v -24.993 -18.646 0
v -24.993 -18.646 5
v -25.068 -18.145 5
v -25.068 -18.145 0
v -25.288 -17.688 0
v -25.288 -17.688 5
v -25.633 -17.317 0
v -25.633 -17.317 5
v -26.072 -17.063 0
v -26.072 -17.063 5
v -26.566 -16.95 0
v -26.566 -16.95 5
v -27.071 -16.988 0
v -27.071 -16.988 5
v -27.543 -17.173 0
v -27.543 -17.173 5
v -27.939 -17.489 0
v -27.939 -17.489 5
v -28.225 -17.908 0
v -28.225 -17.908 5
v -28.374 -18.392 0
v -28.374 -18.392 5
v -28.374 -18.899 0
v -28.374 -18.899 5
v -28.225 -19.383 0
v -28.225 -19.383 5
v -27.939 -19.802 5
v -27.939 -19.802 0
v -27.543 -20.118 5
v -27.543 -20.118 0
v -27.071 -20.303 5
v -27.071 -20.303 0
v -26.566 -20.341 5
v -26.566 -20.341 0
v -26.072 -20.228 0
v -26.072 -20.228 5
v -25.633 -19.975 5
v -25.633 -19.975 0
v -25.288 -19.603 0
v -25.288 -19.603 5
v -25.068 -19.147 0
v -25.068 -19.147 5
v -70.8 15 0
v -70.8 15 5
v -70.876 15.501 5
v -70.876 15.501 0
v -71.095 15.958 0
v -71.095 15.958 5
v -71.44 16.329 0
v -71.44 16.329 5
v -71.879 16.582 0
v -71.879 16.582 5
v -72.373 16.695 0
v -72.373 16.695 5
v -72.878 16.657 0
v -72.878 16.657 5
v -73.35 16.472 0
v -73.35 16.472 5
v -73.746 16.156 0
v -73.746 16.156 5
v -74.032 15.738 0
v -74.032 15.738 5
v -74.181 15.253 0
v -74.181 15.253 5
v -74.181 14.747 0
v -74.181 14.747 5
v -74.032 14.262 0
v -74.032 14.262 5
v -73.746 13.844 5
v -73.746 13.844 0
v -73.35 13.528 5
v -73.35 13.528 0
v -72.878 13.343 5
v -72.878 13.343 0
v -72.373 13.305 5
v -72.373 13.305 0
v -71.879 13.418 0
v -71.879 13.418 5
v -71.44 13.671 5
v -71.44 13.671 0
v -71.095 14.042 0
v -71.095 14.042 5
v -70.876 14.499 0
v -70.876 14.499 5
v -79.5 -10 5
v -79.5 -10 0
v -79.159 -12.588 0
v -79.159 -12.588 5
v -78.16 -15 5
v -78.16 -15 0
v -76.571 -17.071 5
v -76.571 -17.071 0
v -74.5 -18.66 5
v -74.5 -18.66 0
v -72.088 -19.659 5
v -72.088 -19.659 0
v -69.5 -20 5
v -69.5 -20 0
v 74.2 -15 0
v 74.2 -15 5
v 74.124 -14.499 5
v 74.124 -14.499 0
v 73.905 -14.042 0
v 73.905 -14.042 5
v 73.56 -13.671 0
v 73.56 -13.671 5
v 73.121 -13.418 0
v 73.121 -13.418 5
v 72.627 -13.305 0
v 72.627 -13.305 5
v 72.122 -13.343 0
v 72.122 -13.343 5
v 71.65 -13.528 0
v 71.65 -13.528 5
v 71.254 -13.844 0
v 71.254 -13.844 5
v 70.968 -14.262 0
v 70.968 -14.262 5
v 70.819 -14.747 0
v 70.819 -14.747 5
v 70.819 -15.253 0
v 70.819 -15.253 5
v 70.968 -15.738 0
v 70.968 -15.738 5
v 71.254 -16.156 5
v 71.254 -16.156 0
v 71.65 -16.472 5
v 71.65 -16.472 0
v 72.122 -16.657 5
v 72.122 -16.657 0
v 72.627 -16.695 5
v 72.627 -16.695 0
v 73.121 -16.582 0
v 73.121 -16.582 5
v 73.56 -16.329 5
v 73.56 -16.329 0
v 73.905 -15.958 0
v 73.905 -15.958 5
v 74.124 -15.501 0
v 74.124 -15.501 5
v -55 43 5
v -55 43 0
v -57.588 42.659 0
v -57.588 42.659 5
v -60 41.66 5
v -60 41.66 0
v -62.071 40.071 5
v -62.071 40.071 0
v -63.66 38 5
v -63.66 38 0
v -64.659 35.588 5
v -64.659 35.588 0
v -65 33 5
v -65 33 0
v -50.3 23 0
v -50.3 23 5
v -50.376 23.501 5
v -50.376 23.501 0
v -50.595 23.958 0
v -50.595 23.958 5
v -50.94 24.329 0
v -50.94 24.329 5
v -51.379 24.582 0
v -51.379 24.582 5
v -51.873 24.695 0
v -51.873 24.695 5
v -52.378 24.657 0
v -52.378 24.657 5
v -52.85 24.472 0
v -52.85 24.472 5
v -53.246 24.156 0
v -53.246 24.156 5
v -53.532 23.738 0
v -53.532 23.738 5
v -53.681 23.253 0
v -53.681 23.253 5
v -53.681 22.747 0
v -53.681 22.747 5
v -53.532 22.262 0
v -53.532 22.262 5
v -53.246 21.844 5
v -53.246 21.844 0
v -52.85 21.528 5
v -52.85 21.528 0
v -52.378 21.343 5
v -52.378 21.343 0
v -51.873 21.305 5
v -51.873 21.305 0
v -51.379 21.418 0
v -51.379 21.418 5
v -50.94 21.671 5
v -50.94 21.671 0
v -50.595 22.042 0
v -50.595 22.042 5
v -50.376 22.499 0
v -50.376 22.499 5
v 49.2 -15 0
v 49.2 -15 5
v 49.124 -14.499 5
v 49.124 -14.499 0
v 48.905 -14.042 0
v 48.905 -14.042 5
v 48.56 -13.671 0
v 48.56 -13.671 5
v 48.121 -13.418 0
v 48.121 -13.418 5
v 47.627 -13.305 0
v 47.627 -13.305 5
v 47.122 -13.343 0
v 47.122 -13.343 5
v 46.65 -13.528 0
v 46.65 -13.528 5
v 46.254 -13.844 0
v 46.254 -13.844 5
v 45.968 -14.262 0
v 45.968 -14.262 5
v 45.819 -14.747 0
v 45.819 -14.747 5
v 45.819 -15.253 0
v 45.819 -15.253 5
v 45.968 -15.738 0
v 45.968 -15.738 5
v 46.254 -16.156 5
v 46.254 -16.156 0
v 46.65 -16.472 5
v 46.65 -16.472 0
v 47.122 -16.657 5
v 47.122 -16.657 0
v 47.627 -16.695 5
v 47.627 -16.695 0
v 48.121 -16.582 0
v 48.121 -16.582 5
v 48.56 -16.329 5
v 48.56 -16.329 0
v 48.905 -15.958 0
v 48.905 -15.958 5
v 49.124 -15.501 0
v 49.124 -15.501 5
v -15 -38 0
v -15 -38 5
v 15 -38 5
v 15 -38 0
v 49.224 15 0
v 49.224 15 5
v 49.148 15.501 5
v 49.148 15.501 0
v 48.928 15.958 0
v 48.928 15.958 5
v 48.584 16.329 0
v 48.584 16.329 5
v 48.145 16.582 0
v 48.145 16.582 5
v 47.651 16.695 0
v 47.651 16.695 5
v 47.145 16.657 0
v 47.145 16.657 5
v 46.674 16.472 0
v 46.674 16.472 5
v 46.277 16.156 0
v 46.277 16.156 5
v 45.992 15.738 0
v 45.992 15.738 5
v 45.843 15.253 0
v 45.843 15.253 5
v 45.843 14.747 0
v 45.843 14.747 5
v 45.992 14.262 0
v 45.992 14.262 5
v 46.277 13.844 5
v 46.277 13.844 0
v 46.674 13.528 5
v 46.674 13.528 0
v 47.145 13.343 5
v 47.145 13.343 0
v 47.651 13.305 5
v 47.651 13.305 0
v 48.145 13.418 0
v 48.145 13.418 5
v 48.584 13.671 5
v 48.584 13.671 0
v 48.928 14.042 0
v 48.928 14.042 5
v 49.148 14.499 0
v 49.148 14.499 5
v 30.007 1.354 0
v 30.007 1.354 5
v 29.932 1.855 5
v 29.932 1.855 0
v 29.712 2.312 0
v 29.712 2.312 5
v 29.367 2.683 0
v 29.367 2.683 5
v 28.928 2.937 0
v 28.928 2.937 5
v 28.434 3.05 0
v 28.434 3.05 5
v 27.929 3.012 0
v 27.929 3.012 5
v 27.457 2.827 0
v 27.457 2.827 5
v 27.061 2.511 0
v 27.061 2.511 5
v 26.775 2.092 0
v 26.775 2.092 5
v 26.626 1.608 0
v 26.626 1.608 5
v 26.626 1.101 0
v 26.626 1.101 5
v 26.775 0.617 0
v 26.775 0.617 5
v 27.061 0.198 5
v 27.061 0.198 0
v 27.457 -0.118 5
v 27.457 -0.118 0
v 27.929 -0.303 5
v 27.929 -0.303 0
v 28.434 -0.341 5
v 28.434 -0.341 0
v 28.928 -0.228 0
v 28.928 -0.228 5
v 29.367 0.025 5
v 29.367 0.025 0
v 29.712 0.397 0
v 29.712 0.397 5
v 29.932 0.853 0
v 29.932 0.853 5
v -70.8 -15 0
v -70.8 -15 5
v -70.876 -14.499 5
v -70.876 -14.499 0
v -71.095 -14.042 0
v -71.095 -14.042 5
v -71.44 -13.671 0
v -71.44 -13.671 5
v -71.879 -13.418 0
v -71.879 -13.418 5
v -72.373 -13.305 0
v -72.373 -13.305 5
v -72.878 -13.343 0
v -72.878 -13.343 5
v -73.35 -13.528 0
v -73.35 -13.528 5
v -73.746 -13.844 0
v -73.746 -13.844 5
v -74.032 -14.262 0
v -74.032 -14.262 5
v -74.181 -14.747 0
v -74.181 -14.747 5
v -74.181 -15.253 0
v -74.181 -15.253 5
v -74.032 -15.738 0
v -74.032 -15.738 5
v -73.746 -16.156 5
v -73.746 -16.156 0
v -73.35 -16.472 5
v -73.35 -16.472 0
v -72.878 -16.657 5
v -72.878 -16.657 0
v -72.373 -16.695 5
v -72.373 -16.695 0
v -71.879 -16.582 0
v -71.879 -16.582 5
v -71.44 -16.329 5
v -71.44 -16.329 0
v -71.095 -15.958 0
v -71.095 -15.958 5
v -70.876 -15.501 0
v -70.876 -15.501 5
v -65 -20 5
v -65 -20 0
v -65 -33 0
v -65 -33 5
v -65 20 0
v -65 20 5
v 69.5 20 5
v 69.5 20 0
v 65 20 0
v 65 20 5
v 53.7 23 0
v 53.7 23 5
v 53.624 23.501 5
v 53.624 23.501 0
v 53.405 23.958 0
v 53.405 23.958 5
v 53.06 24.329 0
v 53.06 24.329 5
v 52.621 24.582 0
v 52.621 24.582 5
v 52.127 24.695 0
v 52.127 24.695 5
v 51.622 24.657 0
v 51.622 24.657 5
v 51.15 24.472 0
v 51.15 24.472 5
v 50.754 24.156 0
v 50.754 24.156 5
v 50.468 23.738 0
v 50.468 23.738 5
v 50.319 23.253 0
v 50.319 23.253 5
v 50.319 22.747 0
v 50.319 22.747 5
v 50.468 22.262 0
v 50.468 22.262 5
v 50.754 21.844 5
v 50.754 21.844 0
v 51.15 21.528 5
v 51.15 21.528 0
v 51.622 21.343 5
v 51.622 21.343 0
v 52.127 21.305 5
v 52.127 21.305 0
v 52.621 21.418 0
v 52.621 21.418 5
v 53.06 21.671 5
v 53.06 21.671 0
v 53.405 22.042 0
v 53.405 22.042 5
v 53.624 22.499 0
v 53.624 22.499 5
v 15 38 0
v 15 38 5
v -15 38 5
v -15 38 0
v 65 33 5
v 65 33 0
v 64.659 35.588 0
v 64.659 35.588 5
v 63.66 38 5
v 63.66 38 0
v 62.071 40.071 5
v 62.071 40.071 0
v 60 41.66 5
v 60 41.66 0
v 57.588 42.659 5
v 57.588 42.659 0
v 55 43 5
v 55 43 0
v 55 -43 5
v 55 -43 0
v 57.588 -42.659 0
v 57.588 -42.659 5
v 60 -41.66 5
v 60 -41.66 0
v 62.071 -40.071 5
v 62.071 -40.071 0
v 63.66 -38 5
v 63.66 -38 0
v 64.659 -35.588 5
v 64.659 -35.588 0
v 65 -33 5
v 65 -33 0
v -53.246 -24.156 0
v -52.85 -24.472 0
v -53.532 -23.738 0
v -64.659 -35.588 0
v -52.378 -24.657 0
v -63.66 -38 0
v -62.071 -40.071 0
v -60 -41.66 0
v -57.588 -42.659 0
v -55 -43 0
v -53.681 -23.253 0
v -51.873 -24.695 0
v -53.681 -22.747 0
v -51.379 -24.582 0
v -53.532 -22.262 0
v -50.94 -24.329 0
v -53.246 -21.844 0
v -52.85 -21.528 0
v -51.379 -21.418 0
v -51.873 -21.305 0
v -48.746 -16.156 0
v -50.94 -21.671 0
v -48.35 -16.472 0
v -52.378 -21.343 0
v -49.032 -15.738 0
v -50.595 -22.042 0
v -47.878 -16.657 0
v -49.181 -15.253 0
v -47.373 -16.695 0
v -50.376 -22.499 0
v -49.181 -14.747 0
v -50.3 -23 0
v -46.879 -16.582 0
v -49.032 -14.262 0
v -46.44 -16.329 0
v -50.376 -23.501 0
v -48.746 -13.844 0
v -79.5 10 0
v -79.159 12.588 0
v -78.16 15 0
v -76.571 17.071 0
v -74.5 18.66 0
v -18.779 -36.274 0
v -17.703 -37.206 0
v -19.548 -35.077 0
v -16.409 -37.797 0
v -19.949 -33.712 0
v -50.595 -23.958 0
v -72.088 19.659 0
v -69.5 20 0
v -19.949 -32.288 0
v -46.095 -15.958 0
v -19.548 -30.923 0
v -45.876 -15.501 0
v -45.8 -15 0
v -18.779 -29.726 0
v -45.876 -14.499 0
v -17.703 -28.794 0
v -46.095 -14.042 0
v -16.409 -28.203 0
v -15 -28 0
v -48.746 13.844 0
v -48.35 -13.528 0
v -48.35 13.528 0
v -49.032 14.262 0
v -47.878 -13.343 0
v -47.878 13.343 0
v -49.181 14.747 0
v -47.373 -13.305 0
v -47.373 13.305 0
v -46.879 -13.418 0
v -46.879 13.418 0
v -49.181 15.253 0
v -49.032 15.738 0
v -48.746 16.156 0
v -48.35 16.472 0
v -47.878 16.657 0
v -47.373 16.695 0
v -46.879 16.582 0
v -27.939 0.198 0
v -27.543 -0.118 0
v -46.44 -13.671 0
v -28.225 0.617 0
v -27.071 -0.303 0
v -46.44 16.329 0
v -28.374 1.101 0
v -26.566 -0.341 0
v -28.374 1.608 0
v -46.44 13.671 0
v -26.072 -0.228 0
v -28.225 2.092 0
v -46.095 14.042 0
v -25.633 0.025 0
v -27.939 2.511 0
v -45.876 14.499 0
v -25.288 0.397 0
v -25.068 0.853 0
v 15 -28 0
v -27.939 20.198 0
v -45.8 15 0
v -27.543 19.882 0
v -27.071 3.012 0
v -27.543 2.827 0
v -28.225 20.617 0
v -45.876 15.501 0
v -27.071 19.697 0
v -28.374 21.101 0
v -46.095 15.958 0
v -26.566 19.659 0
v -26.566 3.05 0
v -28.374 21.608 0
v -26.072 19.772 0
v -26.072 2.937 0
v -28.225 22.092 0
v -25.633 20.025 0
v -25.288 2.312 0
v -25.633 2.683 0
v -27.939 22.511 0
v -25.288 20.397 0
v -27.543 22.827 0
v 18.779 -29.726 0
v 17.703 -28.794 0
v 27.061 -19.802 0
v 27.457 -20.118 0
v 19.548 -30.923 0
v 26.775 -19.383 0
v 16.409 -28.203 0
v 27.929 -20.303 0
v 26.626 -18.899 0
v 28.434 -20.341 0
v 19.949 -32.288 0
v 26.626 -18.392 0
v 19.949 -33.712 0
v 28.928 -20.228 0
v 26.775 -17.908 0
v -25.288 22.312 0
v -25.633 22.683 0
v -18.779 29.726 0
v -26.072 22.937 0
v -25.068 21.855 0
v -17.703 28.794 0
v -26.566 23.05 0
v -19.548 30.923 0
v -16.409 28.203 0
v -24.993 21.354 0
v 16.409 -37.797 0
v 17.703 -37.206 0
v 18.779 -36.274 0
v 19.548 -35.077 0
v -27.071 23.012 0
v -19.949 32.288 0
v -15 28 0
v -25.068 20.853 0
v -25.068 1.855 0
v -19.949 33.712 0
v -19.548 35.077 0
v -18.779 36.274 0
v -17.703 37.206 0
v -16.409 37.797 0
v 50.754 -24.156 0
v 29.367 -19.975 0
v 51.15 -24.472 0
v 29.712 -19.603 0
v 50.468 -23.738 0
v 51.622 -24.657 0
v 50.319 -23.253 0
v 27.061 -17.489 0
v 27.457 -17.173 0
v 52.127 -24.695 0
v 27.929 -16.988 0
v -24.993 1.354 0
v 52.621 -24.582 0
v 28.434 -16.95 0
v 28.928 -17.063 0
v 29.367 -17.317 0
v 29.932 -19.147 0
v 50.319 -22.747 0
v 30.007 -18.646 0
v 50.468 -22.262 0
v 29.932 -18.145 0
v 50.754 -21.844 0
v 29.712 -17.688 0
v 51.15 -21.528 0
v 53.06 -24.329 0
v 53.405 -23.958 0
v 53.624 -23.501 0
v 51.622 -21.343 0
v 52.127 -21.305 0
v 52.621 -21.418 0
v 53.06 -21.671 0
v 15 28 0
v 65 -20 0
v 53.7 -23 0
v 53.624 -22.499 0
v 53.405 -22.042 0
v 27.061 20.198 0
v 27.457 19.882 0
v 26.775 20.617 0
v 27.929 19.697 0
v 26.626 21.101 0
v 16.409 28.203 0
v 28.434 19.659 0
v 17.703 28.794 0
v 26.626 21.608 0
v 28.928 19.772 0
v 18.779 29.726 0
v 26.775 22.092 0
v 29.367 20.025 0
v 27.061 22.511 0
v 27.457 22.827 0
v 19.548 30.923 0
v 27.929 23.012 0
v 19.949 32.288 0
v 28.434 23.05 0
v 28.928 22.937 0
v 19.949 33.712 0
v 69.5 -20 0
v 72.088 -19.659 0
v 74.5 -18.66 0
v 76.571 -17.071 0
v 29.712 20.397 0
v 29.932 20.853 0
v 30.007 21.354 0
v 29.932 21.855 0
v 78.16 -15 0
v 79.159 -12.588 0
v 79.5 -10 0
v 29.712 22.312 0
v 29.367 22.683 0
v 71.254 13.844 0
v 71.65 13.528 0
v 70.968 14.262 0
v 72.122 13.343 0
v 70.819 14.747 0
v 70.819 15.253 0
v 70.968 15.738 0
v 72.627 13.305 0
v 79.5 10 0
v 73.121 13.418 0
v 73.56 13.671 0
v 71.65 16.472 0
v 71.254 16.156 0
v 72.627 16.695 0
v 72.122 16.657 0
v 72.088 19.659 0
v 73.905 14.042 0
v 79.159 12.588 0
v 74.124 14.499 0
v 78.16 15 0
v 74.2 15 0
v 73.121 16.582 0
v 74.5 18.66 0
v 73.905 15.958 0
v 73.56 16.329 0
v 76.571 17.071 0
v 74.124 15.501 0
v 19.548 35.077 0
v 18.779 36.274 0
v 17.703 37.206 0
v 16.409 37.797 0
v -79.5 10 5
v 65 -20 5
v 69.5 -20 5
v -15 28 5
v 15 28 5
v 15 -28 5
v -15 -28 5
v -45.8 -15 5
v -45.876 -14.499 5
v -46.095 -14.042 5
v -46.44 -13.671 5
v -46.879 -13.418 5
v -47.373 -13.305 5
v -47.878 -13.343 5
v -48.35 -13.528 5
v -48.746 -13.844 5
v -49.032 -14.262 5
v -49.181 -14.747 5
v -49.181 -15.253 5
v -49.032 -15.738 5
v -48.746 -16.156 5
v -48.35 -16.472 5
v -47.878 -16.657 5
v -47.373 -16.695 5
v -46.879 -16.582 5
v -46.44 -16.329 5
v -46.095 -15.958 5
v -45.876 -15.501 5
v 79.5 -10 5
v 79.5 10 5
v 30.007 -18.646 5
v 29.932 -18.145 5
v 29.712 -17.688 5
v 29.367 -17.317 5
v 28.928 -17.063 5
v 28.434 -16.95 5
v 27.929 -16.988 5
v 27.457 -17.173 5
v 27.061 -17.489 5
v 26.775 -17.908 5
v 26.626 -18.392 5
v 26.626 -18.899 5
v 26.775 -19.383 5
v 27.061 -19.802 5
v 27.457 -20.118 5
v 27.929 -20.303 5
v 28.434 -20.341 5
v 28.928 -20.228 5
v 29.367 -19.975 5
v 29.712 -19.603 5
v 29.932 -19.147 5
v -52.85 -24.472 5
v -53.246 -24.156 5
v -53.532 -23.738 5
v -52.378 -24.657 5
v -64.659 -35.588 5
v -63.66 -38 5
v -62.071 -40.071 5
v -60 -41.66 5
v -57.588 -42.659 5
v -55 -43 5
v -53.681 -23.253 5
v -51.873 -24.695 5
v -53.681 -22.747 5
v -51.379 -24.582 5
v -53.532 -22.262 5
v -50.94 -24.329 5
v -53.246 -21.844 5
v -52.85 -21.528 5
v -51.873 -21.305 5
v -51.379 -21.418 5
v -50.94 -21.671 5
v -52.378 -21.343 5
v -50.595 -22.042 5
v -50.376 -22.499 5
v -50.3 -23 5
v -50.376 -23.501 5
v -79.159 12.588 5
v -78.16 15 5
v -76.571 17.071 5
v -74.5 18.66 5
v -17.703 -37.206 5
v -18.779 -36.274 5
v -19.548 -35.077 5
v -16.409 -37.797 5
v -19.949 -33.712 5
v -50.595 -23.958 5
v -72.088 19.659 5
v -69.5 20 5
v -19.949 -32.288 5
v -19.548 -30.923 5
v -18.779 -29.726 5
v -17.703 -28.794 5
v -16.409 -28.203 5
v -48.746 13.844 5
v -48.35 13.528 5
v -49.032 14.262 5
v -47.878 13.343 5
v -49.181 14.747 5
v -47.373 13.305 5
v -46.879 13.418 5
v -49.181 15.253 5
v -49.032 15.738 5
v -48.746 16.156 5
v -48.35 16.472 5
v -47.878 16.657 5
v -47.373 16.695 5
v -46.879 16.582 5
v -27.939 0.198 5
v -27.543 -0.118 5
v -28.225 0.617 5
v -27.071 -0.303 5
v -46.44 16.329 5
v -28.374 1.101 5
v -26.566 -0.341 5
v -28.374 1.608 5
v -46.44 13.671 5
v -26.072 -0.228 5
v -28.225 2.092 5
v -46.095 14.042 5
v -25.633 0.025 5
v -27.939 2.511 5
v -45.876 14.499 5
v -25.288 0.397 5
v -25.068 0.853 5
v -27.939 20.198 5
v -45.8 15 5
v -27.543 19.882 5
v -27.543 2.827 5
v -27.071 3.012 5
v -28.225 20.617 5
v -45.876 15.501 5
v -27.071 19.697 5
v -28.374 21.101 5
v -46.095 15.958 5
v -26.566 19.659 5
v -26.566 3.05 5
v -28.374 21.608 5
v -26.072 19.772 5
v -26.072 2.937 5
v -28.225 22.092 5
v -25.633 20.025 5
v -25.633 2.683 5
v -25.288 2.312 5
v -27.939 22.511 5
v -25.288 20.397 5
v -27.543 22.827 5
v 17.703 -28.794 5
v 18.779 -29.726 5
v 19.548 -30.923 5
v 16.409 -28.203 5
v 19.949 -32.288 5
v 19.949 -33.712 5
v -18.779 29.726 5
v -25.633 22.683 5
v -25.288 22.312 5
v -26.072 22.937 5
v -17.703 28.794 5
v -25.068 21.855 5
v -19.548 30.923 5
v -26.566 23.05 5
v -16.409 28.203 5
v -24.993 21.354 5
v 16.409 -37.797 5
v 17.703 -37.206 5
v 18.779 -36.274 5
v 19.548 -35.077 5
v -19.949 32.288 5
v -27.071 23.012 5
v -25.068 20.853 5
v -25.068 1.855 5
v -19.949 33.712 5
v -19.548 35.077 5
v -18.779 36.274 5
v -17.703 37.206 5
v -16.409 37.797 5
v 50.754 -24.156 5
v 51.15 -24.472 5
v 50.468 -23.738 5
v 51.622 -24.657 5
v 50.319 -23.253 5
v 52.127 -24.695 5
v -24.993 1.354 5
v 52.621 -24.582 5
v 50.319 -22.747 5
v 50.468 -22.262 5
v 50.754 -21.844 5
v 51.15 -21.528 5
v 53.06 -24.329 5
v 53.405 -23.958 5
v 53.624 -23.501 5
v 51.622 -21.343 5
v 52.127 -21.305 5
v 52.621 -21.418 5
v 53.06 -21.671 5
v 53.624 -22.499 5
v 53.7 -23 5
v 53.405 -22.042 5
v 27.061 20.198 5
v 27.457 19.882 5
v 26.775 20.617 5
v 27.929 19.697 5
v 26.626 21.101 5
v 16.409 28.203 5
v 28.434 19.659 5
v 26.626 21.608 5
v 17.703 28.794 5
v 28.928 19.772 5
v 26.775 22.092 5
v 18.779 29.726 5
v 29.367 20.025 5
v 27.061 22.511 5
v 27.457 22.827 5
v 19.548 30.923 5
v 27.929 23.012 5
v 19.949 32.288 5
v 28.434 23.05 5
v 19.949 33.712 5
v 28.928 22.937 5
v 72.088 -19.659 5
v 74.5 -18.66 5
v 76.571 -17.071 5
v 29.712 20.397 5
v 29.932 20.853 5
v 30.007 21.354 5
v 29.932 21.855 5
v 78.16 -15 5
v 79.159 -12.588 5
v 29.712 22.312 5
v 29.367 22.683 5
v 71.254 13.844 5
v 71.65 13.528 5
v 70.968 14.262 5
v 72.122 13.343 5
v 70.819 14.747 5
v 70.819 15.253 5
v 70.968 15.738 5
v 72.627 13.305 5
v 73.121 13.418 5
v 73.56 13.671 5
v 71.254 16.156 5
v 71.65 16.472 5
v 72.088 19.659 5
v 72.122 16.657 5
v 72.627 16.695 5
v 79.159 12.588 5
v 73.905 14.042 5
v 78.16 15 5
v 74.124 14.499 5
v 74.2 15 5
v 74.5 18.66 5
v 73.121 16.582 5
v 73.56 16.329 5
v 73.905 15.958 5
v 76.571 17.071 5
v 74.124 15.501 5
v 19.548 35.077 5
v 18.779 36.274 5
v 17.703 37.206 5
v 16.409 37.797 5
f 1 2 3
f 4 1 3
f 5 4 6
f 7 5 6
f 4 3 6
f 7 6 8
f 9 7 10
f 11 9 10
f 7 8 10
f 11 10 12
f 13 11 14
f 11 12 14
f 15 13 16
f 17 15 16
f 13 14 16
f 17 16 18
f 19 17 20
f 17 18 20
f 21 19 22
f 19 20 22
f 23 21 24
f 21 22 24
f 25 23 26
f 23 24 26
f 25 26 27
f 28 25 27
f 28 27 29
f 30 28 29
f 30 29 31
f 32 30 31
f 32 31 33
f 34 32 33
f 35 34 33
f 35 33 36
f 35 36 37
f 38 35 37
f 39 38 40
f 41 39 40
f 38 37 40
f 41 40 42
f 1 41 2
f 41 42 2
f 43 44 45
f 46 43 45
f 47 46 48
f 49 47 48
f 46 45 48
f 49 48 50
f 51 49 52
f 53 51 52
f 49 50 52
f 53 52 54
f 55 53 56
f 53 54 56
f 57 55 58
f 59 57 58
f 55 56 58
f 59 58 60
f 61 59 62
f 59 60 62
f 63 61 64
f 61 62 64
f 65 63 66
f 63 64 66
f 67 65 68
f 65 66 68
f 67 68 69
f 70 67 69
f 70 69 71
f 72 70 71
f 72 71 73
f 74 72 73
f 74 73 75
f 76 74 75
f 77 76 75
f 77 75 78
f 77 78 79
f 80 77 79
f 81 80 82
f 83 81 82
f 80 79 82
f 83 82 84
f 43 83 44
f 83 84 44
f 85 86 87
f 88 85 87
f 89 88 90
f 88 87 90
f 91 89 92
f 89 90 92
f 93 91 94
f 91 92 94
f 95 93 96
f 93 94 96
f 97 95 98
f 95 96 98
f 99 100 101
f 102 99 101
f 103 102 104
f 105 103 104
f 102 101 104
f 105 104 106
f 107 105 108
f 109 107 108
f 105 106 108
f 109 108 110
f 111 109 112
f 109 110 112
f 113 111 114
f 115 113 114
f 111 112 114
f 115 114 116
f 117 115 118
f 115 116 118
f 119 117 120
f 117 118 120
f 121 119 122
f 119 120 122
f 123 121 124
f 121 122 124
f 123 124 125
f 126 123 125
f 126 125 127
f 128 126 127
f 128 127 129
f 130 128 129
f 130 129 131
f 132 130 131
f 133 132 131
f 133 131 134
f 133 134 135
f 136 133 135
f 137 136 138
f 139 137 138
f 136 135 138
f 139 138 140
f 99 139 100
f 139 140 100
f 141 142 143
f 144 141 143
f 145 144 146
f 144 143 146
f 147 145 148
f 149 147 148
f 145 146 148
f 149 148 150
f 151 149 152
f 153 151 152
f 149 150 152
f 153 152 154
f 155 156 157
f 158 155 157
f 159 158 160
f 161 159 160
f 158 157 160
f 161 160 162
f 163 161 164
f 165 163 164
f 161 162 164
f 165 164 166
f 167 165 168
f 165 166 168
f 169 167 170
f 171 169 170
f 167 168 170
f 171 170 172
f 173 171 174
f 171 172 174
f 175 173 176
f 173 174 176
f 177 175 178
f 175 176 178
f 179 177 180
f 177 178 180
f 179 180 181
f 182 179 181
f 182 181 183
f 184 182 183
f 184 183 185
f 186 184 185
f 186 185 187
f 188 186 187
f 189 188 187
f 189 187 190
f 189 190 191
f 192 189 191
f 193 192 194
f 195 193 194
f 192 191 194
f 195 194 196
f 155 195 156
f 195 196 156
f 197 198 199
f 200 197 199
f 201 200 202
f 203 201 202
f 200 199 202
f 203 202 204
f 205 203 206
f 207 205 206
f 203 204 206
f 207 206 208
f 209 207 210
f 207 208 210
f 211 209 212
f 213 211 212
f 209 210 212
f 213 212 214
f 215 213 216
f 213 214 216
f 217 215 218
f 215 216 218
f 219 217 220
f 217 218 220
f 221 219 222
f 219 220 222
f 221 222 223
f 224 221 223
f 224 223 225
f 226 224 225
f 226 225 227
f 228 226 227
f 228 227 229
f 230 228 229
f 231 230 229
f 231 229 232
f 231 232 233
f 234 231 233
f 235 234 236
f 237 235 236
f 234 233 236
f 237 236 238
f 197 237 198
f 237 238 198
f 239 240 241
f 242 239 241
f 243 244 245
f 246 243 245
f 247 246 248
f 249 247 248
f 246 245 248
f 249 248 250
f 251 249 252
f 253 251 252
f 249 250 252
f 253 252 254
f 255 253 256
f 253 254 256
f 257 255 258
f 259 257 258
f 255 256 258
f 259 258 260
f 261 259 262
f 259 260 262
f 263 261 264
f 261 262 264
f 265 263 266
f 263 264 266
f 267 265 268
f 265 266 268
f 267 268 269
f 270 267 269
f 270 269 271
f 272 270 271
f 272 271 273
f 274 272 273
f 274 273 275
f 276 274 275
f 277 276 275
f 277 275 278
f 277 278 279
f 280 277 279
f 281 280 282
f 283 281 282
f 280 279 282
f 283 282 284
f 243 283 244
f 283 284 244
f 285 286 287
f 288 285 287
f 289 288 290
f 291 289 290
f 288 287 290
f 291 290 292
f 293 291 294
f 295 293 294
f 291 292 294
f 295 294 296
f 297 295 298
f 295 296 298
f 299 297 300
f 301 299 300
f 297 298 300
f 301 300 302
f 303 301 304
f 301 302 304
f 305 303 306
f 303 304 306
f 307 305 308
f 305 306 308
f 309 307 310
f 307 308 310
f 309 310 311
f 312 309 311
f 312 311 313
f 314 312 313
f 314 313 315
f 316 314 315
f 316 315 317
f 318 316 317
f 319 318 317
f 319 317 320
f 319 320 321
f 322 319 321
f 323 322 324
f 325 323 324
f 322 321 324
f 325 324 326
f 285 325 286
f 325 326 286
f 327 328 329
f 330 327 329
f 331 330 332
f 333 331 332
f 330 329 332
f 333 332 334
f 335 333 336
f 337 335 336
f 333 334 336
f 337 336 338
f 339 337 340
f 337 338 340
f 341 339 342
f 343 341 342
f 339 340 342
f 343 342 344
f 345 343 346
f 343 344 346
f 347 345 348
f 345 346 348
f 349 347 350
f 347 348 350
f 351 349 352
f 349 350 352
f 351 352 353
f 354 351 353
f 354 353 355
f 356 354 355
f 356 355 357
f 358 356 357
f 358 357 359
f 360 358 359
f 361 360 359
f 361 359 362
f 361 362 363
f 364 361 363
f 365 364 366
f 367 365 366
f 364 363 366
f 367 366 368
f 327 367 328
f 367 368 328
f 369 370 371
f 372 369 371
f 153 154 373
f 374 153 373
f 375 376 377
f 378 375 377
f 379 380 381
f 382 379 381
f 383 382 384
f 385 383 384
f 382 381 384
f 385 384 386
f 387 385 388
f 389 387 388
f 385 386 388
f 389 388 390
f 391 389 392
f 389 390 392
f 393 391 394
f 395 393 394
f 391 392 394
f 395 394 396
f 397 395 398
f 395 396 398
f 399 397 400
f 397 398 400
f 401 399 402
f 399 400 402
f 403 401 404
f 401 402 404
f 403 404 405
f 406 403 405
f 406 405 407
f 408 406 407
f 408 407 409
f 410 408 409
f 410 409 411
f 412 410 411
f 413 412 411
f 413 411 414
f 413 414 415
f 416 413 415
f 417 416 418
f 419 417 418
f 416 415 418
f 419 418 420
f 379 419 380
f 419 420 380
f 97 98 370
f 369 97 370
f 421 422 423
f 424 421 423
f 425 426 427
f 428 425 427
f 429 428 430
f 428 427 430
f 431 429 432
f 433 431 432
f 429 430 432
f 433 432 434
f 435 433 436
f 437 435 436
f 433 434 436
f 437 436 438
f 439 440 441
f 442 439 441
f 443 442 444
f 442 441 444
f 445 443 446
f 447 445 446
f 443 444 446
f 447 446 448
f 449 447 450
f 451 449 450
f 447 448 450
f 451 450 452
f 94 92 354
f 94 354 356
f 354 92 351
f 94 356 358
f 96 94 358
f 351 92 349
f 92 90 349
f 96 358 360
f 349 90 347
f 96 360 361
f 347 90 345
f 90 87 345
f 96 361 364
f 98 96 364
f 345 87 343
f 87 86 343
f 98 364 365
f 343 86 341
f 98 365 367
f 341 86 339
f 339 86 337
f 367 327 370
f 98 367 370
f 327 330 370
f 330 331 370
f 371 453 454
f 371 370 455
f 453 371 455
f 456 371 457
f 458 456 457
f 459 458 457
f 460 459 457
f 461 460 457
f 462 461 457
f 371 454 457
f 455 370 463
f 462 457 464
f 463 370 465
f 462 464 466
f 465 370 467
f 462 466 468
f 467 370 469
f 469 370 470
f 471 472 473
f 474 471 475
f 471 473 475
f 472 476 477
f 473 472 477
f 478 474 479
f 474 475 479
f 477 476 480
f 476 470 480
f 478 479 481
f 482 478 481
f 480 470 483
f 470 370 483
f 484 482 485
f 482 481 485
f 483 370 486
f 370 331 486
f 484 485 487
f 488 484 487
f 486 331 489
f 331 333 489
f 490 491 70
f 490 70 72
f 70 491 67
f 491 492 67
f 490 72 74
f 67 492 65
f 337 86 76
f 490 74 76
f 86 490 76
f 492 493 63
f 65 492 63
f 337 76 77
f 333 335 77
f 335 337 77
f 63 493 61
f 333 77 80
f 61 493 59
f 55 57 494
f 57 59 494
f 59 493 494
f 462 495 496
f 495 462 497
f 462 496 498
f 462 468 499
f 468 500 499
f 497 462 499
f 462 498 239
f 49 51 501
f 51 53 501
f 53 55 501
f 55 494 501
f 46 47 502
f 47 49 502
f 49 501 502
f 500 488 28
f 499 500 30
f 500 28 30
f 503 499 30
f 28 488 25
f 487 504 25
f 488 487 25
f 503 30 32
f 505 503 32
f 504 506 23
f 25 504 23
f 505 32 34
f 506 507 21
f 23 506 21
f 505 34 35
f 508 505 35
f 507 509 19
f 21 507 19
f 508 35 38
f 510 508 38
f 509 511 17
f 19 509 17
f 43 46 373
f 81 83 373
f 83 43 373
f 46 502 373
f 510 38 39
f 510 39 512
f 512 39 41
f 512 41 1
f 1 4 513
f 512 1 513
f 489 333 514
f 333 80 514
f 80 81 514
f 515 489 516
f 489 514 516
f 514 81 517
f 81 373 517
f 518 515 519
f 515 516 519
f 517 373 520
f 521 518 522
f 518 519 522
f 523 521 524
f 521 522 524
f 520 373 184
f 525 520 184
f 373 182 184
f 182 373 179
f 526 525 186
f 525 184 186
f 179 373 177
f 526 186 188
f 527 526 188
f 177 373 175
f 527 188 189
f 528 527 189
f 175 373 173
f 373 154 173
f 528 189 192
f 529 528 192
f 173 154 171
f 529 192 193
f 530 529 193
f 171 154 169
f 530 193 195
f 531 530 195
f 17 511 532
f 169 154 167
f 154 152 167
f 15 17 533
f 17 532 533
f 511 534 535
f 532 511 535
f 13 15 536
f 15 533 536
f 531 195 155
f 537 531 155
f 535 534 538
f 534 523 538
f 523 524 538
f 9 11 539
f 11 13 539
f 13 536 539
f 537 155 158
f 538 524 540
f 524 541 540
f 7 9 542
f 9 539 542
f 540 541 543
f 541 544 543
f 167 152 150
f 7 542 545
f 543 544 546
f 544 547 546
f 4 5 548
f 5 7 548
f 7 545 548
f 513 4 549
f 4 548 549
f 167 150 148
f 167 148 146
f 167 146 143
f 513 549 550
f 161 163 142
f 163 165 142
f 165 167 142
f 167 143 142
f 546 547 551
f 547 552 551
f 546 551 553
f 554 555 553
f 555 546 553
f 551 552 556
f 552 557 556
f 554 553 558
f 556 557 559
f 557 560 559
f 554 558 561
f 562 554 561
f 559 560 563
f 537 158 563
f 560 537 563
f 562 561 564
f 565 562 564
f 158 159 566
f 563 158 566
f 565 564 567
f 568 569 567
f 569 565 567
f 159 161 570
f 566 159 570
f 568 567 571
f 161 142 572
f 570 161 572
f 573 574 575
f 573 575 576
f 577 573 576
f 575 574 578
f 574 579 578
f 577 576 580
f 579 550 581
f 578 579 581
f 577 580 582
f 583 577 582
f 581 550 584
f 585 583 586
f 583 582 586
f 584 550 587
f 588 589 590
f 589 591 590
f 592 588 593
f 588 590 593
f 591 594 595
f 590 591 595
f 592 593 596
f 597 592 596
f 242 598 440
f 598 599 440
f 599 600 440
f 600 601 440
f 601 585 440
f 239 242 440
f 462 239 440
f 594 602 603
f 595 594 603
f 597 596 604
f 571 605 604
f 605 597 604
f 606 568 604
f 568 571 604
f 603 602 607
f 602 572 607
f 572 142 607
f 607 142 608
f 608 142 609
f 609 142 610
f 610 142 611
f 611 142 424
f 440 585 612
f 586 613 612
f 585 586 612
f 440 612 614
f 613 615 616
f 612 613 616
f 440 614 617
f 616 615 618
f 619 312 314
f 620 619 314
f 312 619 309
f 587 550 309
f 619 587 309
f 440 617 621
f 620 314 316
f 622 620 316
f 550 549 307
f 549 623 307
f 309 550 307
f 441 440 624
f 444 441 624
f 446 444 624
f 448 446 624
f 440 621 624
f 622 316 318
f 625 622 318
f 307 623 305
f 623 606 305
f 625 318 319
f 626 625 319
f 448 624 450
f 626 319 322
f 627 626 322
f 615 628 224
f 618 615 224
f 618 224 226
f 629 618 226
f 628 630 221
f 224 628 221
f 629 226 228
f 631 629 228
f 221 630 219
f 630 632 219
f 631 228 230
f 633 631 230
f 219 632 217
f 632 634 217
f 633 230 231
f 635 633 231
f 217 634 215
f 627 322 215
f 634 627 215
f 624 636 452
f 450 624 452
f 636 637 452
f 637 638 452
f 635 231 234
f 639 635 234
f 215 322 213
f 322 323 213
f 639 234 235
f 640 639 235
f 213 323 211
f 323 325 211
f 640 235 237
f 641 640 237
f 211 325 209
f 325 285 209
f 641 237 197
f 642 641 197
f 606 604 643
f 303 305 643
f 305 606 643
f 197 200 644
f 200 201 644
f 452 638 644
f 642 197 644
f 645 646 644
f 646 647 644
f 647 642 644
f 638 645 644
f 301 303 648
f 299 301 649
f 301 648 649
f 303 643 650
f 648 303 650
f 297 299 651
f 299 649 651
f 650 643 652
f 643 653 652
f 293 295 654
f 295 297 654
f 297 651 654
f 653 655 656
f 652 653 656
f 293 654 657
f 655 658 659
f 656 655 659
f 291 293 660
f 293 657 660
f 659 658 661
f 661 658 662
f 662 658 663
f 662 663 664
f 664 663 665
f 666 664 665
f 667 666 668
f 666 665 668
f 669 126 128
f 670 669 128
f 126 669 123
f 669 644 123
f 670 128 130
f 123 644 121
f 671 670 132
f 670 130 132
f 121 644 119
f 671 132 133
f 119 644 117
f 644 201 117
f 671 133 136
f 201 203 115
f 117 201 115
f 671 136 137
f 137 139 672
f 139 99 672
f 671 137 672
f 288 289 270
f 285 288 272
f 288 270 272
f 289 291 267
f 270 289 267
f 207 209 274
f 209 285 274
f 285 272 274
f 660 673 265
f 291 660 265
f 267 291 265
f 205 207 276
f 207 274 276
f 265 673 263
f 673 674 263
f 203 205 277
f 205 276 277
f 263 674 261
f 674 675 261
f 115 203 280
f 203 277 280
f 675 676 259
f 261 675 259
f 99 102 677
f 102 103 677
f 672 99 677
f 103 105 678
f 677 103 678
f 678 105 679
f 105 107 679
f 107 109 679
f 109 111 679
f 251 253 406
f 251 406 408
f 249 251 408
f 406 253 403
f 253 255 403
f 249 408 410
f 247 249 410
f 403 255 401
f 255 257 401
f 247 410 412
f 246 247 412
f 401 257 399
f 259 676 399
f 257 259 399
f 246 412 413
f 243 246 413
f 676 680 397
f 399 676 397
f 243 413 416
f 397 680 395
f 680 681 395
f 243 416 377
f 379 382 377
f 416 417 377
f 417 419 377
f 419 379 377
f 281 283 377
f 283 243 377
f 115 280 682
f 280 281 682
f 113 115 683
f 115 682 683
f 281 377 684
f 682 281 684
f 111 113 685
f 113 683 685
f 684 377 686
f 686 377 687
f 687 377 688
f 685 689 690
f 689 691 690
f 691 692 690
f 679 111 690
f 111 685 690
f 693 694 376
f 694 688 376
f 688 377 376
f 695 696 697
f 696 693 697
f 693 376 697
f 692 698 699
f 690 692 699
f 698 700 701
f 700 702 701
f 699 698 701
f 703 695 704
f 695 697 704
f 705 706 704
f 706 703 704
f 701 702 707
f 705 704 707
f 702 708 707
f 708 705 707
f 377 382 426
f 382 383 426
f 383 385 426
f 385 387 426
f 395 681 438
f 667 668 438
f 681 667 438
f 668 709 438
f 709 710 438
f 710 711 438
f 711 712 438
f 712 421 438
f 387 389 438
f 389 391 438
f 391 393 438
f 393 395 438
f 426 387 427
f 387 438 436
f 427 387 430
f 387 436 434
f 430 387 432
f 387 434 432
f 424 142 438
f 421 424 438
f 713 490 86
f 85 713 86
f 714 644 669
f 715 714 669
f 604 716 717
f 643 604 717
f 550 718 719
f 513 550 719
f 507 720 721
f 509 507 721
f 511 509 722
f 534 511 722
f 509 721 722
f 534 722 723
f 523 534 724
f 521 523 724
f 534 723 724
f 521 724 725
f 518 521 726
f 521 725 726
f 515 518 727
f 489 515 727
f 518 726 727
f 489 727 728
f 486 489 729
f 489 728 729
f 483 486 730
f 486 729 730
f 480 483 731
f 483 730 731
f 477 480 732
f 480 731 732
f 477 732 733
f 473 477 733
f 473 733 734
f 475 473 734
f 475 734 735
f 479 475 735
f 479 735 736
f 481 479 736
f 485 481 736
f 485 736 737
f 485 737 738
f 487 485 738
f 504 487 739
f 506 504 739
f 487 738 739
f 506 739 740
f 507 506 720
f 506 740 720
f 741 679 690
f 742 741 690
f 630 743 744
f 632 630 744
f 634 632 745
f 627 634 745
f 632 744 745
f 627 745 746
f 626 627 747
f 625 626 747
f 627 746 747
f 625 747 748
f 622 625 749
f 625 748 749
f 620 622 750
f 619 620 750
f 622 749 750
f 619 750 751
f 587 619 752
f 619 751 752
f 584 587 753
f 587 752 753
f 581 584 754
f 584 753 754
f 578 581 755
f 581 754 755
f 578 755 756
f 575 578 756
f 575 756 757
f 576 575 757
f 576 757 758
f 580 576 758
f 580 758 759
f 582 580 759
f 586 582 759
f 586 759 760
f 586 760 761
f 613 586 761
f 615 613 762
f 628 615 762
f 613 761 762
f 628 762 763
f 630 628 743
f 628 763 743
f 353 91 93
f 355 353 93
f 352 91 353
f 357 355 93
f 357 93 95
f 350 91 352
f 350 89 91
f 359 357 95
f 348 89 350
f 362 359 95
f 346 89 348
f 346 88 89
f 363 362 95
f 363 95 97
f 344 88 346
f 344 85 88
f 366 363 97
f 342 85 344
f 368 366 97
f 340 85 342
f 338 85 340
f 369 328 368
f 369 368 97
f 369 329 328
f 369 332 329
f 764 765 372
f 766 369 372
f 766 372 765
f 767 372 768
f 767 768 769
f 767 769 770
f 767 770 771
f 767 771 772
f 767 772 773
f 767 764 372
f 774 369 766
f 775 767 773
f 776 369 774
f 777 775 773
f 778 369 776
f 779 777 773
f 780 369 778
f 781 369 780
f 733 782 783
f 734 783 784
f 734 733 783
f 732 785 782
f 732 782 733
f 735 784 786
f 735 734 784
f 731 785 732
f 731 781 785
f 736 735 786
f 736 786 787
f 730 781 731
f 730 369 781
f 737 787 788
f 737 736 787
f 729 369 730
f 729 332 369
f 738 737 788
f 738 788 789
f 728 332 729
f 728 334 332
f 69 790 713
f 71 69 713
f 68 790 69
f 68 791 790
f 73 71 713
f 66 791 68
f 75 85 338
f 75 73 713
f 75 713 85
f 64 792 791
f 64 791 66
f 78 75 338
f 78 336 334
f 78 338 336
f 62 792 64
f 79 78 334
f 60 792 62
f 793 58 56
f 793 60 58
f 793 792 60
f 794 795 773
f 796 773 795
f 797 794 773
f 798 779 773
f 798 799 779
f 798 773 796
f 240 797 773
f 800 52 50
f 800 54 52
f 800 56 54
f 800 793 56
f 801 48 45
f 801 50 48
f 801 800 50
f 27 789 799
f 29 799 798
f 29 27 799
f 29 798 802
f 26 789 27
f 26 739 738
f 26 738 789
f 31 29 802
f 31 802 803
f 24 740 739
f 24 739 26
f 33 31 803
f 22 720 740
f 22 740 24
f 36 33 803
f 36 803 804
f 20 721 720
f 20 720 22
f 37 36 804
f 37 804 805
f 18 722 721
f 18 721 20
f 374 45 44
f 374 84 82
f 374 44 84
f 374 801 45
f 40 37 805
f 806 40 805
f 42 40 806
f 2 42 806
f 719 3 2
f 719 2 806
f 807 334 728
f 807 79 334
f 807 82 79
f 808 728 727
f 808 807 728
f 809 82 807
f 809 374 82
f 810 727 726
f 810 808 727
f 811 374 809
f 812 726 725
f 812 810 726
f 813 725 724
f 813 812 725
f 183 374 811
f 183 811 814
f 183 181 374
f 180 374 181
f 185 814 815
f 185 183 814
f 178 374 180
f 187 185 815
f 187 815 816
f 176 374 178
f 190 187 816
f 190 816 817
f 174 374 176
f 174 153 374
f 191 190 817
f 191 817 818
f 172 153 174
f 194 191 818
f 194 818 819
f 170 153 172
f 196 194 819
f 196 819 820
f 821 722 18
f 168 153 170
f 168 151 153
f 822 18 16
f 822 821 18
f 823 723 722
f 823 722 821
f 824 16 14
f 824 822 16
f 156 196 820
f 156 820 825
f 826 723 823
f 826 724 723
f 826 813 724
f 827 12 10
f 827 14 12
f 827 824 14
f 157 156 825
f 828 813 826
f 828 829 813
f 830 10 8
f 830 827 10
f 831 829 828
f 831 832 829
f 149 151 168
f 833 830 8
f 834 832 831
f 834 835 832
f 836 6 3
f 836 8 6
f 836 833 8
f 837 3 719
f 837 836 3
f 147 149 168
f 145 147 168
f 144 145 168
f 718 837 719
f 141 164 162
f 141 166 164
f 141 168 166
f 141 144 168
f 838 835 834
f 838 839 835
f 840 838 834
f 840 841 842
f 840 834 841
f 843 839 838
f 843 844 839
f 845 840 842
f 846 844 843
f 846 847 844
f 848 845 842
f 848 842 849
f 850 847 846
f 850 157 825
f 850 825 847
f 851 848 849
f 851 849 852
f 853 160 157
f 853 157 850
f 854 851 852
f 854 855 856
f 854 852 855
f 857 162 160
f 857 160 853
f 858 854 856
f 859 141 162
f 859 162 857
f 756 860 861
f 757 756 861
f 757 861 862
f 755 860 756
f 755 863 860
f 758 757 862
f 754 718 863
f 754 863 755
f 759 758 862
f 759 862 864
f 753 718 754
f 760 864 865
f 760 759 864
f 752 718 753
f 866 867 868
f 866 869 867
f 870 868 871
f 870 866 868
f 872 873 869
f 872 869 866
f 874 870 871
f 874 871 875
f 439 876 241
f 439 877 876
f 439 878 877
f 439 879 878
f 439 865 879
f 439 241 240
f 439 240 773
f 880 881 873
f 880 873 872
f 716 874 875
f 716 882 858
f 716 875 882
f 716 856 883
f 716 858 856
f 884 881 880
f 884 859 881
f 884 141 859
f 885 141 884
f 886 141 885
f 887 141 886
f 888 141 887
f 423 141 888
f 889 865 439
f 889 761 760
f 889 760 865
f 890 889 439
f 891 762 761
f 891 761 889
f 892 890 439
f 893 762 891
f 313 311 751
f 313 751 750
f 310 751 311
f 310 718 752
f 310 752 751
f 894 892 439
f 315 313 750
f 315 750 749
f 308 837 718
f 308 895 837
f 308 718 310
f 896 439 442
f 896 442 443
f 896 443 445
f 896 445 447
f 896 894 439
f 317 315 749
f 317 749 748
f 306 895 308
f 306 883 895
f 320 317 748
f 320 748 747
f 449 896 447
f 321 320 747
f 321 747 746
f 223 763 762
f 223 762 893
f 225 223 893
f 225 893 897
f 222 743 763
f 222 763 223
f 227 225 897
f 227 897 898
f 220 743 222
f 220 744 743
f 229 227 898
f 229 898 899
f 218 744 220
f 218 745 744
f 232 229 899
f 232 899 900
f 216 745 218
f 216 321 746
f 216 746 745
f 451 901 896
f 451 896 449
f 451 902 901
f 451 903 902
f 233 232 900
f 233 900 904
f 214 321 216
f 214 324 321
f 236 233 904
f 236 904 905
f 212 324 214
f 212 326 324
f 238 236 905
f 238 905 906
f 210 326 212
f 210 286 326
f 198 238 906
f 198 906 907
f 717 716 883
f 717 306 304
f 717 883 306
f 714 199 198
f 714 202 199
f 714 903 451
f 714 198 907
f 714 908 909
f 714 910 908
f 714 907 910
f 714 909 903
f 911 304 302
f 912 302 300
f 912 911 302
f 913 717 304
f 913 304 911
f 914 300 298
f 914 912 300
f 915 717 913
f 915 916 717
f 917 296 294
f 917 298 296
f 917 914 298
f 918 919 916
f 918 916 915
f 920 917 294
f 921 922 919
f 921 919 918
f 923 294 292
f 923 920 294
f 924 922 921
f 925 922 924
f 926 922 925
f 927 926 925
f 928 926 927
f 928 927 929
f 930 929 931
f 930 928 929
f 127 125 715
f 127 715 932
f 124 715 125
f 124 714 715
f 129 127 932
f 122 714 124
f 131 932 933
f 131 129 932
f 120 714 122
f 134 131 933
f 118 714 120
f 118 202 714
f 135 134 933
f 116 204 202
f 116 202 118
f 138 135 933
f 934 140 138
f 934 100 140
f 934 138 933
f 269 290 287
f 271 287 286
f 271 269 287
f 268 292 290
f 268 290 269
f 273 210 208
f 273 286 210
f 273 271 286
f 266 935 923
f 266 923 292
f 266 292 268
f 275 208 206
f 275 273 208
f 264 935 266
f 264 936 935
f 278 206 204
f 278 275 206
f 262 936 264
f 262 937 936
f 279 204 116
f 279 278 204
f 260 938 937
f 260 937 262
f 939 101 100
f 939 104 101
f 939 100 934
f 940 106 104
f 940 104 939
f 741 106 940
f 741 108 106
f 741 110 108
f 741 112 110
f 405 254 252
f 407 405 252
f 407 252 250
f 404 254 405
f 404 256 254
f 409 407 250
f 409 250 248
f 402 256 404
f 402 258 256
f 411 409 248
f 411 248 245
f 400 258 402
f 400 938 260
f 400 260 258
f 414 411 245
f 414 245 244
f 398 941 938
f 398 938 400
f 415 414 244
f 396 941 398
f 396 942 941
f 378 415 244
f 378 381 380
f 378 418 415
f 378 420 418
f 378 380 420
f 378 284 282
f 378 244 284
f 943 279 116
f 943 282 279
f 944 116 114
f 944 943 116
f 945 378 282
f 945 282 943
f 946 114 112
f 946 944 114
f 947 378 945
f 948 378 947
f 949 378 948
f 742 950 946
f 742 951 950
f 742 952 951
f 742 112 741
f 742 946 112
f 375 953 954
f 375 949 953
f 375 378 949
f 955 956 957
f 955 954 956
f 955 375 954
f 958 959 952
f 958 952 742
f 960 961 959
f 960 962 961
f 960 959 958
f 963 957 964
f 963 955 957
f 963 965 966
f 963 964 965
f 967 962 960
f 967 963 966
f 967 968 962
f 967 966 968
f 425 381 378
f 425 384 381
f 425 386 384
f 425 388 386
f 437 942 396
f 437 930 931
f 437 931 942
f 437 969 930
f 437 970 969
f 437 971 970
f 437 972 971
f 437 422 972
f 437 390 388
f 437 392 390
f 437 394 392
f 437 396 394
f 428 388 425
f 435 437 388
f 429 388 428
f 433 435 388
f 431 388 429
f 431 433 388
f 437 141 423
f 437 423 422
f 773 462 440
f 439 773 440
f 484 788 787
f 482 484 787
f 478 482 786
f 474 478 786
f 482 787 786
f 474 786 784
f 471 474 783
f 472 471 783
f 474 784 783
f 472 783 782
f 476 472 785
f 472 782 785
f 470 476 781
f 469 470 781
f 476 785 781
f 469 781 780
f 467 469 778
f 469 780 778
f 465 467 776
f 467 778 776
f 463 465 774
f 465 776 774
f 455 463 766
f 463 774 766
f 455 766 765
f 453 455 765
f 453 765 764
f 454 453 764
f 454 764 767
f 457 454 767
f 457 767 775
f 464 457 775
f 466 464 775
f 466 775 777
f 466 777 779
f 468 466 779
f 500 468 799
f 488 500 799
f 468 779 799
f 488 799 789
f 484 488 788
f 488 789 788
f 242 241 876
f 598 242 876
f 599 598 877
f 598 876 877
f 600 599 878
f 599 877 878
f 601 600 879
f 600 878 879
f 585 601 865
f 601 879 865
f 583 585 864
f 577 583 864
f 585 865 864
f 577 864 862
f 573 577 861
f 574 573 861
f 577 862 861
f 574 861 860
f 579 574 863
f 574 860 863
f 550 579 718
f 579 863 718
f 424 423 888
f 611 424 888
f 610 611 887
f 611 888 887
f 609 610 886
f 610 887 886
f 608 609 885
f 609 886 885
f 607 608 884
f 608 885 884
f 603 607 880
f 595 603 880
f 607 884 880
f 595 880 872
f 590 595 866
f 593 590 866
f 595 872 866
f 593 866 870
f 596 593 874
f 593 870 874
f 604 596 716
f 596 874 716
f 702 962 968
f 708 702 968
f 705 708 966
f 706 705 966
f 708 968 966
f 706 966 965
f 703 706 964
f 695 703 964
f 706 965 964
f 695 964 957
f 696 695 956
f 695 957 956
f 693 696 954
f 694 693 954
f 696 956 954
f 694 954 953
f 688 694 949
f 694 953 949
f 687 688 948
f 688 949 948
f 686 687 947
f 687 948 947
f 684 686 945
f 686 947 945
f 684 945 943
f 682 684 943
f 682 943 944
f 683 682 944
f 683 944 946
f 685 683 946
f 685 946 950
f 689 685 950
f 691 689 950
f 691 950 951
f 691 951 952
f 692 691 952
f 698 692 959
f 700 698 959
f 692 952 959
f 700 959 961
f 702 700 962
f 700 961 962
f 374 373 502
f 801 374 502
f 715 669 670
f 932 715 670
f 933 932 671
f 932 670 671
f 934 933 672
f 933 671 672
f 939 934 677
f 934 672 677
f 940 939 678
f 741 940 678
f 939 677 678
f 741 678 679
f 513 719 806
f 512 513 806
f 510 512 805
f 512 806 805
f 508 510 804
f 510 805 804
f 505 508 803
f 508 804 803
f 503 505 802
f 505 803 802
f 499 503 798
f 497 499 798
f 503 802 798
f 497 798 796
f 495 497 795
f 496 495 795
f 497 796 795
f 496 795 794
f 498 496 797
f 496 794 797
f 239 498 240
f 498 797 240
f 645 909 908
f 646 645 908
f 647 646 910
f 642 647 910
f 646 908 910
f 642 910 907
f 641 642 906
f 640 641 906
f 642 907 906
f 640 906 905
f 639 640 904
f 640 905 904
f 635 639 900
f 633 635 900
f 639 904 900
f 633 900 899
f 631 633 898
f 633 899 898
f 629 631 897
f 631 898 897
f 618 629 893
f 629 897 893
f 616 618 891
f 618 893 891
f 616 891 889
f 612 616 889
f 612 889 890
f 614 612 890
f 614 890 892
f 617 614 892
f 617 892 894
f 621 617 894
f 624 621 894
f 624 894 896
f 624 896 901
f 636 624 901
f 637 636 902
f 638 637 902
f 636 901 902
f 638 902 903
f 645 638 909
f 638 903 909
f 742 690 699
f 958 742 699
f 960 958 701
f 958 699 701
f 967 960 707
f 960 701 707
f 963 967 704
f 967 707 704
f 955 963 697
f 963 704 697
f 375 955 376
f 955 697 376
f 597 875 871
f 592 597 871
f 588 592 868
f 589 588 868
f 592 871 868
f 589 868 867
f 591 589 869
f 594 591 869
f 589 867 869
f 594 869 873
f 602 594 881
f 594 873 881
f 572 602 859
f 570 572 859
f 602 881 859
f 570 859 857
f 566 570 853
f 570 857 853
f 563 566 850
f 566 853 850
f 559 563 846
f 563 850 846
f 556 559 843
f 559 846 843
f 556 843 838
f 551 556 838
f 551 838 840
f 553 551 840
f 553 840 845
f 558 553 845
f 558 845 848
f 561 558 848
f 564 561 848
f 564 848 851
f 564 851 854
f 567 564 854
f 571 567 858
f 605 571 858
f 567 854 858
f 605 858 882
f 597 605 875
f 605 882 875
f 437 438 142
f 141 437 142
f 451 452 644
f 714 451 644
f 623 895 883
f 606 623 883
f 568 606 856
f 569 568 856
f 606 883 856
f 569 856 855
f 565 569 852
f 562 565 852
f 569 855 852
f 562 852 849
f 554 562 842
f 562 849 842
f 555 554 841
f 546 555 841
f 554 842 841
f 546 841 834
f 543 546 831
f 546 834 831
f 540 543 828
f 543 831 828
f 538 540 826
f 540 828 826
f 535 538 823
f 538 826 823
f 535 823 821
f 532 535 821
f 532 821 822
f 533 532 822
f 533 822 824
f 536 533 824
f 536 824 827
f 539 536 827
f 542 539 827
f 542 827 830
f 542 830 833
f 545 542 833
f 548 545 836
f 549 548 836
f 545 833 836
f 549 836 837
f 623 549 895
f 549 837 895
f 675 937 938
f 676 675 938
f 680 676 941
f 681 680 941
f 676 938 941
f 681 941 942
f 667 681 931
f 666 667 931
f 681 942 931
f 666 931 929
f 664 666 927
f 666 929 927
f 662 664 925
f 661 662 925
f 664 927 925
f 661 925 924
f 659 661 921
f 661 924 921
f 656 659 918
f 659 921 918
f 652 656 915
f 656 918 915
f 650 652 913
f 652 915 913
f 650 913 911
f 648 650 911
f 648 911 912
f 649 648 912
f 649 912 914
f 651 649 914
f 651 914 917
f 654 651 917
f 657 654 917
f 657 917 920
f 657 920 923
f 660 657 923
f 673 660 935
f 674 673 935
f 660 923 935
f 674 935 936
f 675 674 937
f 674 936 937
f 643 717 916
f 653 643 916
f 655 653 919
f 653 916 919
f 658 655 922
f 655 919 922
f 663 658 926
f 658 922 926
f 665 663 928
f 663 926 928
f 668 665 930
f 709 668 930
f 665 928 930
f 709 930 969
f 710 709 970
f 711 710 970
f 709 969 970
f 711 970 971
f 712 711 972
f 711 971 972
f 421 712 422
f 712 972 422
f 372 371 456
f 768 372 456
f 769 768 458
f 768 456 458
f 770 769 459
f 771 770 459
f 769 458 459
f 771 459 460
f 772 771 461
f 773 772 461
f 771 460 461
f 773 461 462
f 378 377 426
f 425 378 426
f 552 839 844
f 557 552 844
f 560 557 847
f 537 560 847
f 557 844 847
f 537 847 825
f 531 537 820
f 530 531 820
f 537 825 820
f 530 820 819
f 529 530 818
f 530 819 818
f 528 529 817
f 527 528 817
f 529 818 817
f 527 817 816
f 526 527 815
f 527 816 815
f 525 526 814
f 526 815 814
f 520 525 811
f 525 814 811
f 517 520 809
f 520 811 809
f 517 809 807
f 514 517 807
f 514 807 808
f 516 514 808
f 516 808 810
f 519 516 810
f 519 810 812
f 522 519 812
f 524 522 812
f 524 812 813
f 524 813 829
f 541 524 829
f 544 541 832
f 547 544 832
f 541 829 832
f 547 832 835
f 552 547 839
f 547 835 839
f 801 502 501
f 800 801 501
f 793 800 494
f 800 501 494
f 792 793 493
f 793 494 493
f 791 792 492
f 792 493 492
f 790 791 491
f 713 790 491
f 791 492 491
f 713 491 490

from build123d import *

# Parameters (mm, degrees)
BOSS_EXTRUDE2_DEPTH = 5
SKETCH3_R           = 1.7
CUT_EXTRUDE1_DEPTH  = 5


with BuildPart() as part:
    # Sketch1 → Boss-Extrude2 (new body)
    with BuildSketch(Plane.XY):
        with BuildLine():
            Line((-65, -20), (-65, -33))
            ThreePointArc((-65, -33), (-62.071067812, -40.071067812), (-55, -43))
            Line((-55, -43), (55, -43))
            ThreePointArc((55, -43), (62.071067812, -40.071067812), (65, -33))
            Line((65, -33), (65, -20))
            Line((65, -20), (69.5, -20))
            ThreePointArc((69.5, -20), (76.571067812, -17.071067812), (79.5, -10))
            Line((79.5, -10), (79.5, 10))
            ThreePointArc((79.5, 10), (76.571067812, 17.071067812), (69.5, 20))
            Line((69.5, 20), (65, 20))
            Line((65, 20), (65, 33))
            ThreePointArc((65, 33), (62.071067812, 40.071067812), (55, 43))
            Line((55, 43), (-55, 43))
            ThreePointArc((-55, 43), (-62.071067812, 40.071067812), (-65, 33))
            Line((-65, 33), (-65, 20))
            Line((-65, 20), (-69.5, 20))
            ThreePointArc((-69.5, 20), (-76.571067812, 17.071067812), (-79.5, 10))
            Line((-79.5, 10), (-79.5, -10))
            ThreePointArc((-79.5, -10), (-76.571067812, -17.071067812), (-69.5, -20))
            Line((-69.5, -20), (-65, -20))
        make_face()
    extrude(amount=BOSS_EXTRUDE2_DEPTH)

    # Sketch3 → Cut-Extrude1 (cut)
    with BuildSketch(Plane.XY.offset(5)):
        with Locations((-47.5, -15)):
            Circle(SKETCH3_R)
        with Locations((-47.5, 15)):
            Circle(SKETCH3_R)
        with Locations((72.5, 15)):
            Circle(SKETCH3_R)
        with Locations((47.52365162, 15)):
            Circle(SKETCH3_R)
        with Locations((72.5, -15)):
            Circle(SKETCH3_R)
        with Locations((47.5, -15)):
            Circle(SKETCH3_R)
        with BuildLine():
            Line((15, 38), (-15, 38))
            ThreePointArc((-15, 38), (-20, 33), (-15, 28))
            Line((-15, 28), (15, 28))
            ThreePointArc((15, 28), (20, 33), (15, 38))
        make_face()
        with BuildLine():
            Line((15, -28), (-15, -28))
            ThreePointArc((-15, -28), (-20, -33), (-15, -38))
            Line((-15, -38), (15, -38))
            ThreePointArc((15, -38), (20, -33), (15, -28))
        make_face()
        with Locations((-72.5, -15)):
            Circle(SKETCH3_R)
        with Locations((-72.5, 15)):
            Circle(SKETCH3_R)
        with Locations((-26.692902898, 21.354322319)):
            Circle(SKETCH3_R)
        with Locations((-26.692902898, 1.354322319)):
            Circle(SKETCH3_R)
        with Locations((-26.692902898, -18.645677681)):
            Circle(SKETCH3_R)
        with Locations((28.307097102, -18.645677681)):
            Circle(SKETCH3_R)
        with Locations((28.307097102, 1.354322319)):
            Circle(SKETCH3_R)
        with Locations((28.307097102, 21.354322319)):
            Circle(SKETCH3_R)
        with Locations((-52, 23)):
            Circle(SKETCH3_R)
        with Locations((-52, -23)):
            Circle(SKETCH3_R)
        with Locations((52, -23)):
            Circle(SKETCH3_R)
        with Locations((52, 23)):
            Circle(SKETCH3_R)
    extrude(amount=-CUT_EXTRUDE1_DEPTH, mode=Mode.SUBTRACT)


solid = part.part
